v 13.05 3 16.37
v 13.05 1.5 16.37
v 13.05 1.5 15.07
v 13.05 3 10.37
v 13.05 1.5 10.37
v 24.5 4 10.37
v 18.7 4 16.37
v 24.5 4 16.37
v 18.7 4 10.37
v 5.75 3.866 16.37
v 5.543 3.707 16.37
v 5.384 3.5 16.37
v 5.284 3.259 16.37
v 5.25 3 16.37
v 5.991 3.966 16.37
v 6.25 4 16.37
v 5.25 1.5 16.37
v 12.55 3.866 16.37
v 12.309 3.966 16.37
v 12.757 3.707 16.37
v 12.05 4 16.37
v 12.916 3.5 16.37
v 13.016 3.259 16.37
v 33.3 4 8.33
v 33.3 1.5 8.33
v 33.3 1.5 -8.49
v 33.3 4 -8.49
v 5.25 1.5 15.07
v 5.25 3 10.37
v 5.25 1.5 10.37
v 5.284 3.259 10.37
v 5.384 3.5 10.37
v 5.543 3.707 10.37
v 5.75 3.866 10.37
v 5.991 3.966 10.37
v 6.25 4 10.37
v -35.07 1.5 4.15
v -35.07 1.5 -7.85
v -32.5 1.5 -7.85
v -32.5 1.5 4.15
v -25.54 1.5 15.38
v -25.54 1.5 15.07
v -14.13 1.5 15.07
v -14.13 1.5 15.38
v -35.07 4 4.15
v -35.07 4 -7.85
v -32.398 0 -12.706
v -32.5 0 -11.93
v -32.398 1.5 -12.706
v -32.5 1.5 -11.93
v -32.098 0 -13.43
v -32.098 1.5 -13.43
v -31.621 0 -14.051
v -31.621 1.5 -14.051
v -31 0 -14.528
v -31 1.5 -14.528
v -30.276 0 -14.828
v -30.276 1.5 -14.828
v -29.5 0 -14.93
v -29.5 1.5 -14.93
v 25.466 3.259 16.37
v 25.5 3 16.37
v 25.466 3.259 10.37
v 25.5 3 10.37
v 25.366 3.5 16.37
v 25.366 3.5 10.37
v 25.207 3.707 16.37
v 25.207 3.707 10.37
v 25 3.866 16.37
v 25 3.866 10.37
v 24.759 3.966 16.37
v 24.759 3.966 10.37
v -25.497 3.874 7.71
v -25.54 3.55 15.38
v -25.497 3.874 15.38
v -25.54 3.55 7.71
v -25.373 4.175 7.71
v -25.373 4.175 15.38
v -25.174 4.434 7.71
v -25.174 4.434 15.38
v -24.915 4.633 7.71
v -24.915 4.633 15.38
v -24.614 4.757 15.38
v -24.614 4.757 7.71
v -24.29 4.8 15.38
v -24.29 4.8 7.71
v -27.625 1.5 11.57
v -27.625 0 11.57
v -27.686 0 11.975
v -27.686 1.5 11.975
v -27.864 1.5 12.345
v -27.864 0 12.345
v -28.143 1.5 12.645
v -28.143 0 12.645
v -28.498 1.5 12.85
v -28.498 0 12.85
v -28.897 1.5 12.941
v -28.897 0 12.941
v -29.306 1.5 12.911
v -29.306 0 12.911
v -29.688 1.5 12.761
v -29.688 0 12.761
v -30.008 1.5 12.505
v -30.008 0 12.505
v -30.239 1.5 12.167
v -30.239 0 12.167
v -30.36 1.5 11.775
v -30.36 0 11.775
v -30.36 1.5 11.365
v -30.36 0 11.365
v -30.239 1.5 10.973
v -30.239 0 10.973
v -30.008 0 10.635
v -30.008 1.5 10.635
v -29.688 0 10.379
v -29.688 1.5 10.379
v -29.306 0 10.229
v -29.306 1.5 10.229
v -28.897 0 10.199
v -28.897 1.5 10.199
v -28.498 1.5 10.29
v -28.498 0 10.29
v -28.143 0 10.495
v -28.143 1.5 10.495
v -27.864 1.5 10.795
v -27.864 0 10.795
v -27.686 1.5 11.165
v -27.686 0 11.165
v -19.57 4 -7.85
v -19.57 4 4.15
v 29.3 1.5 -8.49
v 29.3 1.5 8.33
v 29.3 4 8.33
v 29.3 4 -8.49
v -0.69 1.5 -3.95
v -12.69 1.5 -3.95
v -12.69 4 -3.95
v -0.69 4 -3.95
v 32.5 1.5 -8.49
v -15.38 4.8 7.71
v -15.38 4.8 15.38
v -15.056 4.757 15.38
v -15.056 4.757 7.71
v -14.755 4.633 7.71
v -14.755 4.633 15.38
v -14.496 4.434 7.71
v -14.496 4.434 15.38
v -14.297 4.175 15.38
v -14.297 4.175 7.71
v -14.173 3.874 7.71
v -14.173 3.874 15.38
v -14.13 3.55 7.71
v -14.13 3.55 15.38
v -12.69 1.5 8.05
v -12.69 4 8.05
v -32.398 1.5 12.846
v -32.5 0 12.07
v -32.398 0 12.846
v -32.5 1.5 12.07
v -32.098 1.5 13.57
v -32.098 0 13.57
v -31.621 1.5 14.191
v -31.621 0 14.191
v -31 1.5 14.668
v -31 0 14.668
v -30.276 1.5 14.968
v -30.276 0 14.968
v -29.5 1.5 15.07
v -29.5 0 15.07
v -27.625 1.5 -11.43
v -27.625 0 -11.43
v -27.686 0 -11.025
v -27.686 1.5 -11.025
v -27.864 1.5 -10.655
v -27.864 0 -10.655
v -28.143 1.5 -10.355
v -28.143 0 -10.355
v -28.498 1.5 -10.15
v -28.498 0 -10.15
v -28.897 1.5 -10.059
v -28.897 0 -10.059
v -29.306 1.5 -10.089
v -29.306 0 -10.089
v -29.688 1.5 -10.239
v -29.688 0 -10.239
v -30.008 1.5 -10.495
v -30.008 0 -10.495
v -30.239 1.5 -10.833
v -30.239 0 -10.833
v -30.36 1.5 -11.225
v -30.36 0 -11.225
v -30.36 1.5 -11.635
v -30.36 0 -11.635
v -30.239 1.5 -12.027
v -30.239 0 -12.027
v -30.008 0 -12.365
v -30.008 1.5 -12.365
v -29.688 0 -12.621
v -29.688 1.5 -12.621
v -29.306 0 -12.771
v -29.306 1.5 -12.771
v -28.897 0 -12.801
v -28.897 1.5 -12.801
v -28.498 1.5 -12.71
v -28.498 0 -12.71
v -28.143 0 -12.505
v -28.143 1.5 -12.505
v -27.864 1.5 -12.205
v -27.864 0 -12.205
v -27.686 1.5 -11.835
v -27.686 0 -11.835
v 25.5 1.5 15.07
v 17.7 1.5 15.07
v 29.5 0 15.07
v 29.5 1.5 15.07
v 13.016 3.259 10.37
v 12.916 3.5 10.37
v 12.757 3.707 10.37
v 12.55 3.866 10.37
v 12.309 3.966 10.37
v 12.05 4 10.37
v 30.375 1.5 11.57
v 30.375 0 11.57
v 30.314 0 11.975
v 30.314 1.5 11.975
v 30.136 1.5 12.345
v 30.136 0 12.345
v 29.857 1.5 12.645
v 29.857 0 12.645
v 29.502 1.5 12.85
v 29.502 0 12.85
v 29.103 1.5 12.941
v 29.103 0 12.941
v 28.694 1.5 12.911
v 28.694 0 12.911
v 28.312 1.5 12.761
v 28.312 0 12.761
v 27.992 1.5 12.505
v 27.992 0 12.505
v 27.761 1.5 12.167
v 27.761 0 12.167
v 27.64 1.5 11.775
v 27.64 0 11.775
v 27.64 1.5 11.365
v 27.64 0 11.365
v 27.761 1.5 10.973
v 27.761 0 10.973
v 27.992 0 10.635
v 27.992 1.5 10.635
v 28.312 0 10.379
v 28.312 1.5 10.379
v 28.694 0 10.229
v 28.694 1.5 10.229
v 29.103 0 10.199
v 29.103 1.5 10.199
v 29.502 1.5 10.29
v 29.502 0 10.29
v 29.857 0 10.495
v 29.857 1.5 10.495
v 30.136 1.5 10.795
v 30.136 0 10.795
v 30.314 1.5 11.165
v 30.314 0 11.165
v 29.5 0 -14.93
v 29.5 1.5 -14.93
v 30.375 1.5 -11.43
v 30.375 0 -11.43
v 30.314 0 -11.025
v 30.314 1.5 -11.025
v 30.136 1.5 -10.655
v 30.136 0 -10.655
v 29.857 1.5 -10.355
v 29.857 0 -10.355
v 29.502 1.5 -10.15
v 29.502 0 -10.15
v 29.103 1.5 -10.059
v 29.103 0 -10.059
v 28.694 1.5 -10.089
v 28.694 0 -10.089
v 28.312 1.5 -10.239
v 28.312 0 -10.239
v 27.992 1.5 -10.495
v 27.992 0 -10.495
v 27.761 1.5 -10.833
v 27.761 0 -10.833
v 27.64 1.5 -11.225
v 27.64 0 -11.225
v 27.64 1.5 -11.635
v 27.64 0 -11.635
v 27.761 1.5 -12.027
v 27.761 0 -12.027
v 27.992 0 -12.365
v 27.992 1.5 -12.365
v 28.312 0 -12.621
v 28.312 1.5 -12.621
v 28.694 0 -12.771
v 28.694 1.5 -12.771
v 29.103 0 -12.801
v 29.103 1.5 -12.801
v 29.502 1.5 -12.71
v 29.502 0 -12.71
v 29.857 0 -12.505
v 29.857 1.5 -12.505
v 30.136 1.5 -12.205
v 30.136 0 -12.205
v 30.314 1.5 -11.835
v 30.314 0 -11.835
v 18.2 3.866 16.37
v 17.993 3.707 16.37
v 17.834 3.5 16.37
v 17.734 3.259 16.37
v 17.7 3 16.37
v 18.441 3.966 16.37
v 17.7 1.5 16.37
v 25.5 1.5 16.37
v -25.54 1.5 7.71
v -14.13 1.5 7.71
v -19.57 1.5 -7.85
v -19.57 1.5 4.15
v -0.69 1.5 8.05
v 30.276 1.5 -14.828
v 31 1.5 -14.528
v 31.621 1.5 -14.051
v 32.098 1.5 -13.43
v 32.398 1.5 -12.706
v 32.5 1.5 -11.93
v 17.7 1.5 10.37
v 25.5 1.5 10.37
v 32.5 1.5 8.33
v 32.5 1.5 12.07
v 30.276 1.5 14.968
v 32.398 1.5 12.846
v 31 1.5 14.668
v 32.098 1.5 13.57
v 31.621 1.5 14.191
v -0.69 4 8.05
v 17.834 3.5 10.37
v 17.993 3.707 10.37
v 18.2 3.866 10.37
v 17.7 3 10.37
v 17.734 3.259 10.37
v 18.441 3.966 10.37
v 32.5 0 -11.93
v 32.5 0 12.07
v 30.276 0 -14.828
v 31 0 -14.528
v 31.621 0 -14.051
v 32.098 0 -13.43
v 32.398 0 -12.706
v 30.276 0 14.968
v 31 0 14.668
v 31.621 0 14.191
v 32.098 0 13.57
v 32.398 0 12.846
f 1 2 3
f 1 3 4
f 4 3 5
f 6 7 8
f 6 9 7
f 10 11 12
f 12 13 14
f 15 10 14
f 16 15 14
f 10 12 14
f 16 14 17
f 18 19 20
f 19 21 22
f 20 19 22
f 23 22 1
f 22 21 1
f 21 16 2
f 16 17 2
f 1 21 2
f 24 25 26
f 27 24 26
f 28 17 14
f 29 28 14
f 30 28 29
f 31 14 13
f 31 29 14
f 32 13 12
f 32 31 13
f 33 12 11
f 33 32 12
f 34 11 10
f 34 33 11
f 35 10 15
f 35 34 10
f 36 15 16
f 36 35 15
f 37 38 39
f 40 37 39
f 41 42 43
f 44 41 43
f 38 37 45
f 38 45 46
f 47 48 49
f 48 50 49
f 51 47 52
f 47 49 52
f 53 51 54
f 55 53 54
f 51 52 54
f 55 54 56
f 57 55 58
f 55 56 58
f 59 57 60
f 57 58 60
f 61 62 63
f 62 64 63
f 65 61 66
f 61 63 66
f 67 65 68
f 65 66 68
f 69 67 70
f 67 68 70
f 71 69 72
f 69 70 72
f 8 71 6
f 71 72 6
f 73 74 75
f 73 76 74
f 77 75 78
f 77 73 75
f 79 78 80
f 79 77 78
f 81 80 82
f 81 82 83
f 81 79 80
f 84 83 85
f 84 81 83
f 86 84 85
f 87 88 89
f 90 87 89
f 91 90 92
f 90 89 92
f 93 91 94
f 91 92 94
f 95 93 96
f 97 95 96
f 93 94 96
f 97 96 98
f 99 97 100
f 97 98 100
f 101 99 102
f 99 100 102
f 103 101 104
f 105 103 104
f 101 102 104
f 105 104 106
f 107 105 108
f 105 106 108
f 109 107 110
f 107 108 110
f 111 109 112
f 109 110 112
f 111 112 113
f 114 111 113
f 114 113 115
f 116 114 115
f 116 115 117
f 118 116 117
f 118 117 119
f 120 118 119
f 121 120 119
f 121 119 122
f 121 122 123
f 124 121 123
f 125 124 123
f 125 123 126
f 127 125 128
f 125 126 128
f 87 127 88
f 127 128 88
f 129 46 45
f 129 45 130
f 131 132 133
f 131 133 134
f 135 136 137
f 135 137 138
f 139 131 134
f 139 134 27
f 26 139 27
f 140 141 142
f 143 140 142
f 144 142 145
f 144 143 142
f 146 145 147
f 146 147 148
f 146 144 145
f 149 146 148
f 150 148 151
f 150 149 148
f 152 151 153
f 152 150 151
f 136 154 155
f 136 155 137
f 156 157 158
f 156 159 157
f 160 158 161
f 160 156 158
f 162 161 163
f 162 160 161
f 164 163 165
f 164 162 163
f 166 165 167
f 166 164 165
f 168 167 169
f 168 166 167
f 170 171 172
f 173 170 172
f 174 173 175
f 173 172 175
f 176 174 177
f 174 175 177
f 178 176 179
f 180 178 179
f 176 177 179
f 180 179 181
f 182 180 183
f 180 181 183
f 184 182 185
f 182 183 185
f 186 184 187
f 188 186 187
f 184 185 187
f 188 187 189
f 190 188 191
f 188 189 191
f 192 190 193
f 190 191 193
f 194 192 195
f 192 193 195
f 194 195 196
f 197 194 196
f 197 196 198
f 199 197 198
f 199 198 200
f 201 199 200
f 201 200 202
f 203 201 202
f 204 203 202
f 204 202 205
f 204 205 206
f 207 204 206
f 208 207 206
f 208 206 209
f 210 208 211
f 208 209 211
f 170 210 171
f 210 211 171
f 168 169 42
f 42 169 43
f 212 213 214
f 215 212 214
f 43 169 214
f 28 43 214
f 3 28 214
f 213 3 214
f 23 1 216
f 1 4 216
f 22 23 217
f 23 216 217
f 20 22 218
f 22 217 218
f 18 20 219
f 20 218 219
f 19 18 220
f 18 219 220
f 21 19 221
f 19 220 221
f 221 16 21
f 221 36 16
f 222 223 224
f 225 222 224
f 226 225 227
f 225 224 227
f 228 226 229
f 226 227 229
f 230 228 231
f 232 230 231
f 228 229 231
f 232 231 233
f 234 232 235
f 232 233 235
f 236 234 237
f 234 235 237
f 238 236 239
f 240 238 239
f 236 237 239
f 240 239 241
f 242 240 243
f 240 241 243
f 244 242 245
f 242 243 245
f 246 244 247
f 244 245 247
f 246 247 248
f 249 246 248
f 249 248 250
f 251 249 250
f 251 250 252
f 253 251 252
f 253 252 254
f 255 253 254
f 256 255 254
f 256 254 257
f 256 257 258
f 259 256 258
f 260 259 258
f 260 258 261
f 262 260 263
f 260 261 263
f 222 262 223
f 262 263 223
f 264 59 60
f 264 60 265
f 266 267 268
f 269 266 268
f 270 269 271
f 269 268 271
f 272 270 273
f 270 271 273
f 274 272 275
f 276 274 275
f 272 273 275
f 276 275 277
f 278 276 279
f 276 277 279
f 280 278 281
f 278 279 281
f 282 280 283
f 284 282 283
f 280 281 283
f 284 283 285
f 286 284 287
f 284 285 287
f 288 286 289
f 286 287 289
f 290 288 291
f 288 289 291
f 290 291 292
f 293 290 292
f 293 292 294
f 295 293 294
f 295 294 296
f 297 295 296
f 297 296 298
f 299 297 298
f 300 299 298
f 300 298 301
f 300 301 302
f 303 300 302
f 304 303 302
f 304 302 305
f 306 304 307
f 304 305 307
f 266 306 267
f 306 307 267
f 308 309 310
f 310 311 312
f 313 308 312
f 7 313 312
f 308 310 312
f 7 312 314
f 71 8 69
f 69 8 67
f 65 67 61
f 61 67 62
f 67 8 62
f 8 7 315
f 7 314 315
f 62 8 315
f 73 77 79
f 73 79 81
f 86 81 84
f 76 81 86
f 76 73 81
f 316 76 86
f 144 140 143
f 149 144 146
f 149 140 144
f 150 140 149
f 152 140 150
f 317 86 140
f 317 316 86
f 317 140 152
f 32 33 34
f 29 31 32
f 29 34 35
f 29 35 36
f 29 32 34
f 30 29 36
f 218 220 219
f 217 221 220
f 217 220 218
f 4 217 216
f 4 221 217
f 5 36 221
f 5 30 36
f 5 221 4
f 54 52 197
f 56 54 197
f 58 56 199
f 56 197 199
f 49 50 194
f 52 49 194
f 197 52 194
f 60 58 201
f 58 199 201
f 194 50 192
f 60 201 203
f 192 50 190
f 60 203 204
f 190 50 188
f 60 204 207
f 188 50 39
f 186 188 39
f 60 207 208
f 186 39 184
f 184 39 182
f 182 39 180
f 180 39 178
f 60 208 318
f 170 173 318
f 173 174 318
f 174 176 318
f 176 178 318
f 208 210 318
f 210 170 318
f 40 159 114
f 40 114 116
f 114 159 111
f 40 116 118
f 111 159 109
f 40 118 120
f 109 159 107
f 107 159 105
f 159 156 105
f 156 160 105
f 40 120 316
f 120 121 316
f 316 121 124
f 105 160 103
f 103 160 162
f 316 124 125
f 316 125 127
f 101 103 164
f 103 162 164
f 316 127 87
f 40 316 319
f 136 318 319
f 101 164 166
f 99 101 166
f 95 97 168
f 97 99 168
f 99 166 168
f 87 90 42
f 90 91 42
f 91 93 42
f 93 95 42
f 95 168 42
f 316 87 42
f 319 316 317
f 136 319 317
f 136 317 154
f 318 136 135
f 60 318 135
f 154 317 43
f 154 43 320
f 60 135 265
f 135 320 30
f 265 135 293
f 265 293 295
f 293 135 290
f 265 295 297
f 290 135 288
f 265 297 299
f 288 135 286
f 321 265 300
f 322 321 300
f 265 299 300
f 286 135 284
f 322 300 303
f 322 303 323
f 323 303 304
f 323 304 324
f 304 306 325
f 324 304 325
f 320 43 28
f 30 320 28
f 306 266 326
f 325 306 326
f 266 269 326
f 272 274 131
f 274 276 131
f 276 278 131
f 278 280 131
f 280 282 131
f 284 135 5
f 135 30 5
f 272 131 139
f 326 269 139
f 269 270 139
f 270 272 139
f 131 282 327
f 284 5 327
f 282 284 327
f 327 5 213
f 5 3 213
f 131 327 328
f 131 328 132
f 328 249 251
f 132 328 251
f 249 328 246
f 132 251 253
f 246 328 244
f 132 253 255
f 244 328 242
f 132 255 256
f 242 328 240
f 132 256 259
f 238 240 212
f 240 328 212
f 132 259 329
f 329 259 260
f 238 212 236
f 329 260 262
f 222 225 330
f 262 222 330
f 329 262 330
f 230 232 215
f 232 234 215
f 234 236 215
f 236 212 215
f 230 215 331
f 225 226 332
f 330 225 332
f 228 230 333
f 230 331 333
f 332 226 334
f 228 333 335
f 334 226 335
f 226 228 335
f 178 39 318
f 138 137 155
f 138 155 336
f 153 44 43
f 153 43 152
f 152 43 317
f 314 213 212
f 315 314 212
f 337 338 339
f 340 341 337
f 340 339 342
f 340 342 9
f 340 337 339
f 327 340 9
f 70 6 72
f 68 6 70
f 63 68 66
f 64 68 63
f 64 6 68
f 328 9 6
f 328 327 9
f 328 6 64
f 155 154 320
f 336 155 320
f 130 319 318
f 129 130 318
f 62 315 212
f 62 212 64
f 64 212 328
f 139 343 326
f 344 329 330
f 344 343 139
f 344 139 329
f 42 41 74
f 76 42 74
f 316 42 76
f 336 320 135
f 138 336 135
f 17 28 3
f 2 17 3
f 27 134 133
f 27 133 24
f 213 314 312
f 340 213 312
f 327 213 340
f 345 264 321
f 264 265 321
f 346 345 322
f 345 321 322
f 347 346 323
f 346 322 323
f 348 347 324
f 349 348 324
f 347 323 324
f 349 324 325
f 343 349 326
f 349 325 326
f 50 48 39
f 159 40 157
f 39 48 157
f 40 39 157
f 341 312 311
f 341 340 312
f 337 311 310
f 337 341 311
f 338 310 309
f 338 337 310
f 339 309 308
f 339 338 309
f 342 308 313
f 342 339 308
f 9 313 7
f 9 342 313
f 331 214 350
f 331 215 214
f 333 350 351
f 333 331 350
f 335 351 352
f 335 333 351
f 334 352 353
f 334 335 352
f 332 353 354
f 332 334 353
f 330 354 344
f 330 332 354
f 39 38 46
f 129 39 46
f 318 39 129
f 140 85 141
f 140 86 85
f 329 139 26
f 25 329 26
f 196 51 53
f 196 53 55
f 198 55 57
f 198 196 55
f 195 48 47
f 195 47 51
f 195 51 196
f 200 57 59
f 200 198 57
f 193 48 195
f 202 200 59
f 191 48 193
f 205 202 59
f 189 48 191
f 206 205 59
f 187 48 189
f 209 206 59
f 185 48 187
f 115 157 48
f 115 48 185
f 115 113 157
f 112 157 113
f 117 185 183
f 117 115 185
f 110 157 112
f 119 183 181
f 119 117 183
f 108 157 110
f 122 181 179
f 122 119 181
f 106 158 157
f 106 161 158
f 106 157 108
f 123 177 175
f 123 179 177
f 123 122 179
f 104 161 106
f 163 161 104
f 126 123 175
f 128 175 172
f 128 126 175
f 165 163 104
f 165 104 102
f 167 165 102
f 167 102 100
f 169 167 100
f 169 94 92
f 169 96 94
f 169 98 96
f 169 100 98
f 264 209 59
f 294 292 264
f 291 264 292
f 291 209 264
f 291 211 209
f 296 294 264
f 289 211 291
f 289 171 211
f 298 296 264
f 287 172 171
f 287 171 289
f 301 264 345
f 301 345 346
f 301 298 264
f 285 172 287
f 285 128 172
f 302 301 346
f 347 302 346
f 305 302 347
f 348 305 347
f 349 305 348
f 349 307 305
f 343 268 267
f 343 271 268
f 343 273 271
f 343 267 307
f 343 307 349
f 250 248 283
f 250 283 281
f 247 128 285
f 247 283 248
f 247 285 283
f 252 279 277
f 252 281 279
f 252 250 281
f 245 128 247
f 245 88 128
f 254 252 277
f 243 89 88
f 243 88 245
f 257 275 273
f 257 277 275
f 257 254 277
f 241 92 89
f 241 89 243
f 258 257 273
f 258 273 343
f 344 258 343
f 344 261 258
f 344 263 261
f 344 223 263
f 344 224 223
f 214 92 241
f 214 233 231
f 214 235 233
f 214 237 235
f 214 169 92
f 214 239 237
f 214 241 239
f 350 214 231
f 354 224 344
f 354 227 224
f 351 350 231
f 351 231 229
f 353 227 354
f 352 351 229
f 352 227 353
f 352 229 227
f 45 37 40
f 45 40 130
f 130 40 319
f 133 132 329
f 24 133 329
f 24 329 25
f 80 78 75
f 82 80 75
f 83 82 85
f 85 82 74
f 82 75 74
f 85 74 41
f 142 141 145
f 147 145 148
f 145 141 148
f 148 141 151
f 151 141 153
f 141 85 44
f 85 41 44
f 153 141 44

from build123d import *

# Parameters (mm, degrees)
SKETCH_W      = 65
SKETCH_H      = 30
SKETCH_R      = 1.375
PAD_DEPTH     = 1.5
FILLET_R      = 3
SKETCH001_W   = 15.5
SKETCH001_H   = 12
SKETCH001_W_2 = 12
SKETCH001_W_3 = 4
SKETCH001_H_2 = 16.82
SKETCH001_W_4 = 7.8
SKETCH001_H_3 = 6
PAD001_DEPTH  = 2.5
SKETCH002_W   = 11.41
SKETCH002_H   = 7.67
PAD002_DEPTH  = 3.3
FILLET001_R   = 1.25
FILLET002_R   = 1


with BuildPart() as part:
    # Sketch → Pad (new body)
    with BuildSketch(Plane.XZ):
        with Locations((0, 0.07)):
            Rectangle(SKETCH_W, SKETCH_H)
        with Locations((-29, 11.57)):
            Circle(SKETCH_R, mode=Mode.SUBTRACT)
        with Locations((-29, -11.43)):
            Circle(SKETCH_R, mode=Mode.SUBTRACT)
        with Locations((29, -11.43)):
            Circle(SKETCH_R, mode=Mode.SUBTRACT)
        with Locations((29, 11.57)):
            Circle(SKETCH_R, mode=Mode.SUBTRACT)
    extrude(amount=-PAD_DEPTH)

    # Fillet
    fillet_edges = [part.edges().sort_by_distance(p)[0] for p in [
        (-32.5, 0.75, 15.07),
        (-32.5, 0.75, -14.93),
        (32.5, 0.75, -14.93),
        (32.5, 0.75, 15.07),
    ]]
    fillet(fillet_edges, radius=FILLET_R)

    # Sketch001 (on Face5 of Fillet) → Pad001 (join)
    with BuildSketch(Plane(origin=(0, 1.5, 0), x_dir=(1, 0, 0), z_dir=(0, 1, 0))):
        with Locations((-27.32, 1.85)):
            Rectangle(SKETCH001_W, SKETCH001_H)
        with Locations((-6.69, -2.05)):
            Rectangle(SKETCH001_W_2, SKETCH001_H)
        with Locations((31.3, 0.08)):
            Rectangle(SKETCH001_W_3, SKETCH001_H_2)
        with Locations((21.6, -13.37)):
            Rectangle(SKETCH001_W_4, SKETCH001_H_3)
        with Locations((9.15, -13.37)):
            Rectangle(SKETCH001_W_4, SKETCH001_H_3)
    extrude(amount=PAD001_DEPTH)

    # Sketch002 (on Face5 of Pad001) → Pad002 (join)
    with BuildSketch(Plane(origin=(0, 1.5, 0), x_dir=(1, 0, 0), z_dir=(0, 1, 0))):
        with Locations((-19.835, -11.545)):
            Rectangle(SKETCH002_W, SKETCH002_H)
    extrude(amount=PAD002_DEPTH)

    # Fillet001
    fillet001_edges = [part.edges().sort_by_distance(p)[0] for p in [
        (-25.54, 4.8, 11.545),
        (-14.13, 4.8, 11.545),
    ]]
    fillet(fillet001_edges, radius=FILLET001_R)

    # Fillet002
    fillet002_edges = [part.edges().sort_by_distance(p)[0] for p in [
        (5.25, 4, 13.37),
        (13.05, 4, 13.37),
        (17.7, 4, 13.37),
        (25.5, 4, 13.37),
    ]]
    fillet(fillet002_edges, radius=FILLET002_R)


solid = part.part
